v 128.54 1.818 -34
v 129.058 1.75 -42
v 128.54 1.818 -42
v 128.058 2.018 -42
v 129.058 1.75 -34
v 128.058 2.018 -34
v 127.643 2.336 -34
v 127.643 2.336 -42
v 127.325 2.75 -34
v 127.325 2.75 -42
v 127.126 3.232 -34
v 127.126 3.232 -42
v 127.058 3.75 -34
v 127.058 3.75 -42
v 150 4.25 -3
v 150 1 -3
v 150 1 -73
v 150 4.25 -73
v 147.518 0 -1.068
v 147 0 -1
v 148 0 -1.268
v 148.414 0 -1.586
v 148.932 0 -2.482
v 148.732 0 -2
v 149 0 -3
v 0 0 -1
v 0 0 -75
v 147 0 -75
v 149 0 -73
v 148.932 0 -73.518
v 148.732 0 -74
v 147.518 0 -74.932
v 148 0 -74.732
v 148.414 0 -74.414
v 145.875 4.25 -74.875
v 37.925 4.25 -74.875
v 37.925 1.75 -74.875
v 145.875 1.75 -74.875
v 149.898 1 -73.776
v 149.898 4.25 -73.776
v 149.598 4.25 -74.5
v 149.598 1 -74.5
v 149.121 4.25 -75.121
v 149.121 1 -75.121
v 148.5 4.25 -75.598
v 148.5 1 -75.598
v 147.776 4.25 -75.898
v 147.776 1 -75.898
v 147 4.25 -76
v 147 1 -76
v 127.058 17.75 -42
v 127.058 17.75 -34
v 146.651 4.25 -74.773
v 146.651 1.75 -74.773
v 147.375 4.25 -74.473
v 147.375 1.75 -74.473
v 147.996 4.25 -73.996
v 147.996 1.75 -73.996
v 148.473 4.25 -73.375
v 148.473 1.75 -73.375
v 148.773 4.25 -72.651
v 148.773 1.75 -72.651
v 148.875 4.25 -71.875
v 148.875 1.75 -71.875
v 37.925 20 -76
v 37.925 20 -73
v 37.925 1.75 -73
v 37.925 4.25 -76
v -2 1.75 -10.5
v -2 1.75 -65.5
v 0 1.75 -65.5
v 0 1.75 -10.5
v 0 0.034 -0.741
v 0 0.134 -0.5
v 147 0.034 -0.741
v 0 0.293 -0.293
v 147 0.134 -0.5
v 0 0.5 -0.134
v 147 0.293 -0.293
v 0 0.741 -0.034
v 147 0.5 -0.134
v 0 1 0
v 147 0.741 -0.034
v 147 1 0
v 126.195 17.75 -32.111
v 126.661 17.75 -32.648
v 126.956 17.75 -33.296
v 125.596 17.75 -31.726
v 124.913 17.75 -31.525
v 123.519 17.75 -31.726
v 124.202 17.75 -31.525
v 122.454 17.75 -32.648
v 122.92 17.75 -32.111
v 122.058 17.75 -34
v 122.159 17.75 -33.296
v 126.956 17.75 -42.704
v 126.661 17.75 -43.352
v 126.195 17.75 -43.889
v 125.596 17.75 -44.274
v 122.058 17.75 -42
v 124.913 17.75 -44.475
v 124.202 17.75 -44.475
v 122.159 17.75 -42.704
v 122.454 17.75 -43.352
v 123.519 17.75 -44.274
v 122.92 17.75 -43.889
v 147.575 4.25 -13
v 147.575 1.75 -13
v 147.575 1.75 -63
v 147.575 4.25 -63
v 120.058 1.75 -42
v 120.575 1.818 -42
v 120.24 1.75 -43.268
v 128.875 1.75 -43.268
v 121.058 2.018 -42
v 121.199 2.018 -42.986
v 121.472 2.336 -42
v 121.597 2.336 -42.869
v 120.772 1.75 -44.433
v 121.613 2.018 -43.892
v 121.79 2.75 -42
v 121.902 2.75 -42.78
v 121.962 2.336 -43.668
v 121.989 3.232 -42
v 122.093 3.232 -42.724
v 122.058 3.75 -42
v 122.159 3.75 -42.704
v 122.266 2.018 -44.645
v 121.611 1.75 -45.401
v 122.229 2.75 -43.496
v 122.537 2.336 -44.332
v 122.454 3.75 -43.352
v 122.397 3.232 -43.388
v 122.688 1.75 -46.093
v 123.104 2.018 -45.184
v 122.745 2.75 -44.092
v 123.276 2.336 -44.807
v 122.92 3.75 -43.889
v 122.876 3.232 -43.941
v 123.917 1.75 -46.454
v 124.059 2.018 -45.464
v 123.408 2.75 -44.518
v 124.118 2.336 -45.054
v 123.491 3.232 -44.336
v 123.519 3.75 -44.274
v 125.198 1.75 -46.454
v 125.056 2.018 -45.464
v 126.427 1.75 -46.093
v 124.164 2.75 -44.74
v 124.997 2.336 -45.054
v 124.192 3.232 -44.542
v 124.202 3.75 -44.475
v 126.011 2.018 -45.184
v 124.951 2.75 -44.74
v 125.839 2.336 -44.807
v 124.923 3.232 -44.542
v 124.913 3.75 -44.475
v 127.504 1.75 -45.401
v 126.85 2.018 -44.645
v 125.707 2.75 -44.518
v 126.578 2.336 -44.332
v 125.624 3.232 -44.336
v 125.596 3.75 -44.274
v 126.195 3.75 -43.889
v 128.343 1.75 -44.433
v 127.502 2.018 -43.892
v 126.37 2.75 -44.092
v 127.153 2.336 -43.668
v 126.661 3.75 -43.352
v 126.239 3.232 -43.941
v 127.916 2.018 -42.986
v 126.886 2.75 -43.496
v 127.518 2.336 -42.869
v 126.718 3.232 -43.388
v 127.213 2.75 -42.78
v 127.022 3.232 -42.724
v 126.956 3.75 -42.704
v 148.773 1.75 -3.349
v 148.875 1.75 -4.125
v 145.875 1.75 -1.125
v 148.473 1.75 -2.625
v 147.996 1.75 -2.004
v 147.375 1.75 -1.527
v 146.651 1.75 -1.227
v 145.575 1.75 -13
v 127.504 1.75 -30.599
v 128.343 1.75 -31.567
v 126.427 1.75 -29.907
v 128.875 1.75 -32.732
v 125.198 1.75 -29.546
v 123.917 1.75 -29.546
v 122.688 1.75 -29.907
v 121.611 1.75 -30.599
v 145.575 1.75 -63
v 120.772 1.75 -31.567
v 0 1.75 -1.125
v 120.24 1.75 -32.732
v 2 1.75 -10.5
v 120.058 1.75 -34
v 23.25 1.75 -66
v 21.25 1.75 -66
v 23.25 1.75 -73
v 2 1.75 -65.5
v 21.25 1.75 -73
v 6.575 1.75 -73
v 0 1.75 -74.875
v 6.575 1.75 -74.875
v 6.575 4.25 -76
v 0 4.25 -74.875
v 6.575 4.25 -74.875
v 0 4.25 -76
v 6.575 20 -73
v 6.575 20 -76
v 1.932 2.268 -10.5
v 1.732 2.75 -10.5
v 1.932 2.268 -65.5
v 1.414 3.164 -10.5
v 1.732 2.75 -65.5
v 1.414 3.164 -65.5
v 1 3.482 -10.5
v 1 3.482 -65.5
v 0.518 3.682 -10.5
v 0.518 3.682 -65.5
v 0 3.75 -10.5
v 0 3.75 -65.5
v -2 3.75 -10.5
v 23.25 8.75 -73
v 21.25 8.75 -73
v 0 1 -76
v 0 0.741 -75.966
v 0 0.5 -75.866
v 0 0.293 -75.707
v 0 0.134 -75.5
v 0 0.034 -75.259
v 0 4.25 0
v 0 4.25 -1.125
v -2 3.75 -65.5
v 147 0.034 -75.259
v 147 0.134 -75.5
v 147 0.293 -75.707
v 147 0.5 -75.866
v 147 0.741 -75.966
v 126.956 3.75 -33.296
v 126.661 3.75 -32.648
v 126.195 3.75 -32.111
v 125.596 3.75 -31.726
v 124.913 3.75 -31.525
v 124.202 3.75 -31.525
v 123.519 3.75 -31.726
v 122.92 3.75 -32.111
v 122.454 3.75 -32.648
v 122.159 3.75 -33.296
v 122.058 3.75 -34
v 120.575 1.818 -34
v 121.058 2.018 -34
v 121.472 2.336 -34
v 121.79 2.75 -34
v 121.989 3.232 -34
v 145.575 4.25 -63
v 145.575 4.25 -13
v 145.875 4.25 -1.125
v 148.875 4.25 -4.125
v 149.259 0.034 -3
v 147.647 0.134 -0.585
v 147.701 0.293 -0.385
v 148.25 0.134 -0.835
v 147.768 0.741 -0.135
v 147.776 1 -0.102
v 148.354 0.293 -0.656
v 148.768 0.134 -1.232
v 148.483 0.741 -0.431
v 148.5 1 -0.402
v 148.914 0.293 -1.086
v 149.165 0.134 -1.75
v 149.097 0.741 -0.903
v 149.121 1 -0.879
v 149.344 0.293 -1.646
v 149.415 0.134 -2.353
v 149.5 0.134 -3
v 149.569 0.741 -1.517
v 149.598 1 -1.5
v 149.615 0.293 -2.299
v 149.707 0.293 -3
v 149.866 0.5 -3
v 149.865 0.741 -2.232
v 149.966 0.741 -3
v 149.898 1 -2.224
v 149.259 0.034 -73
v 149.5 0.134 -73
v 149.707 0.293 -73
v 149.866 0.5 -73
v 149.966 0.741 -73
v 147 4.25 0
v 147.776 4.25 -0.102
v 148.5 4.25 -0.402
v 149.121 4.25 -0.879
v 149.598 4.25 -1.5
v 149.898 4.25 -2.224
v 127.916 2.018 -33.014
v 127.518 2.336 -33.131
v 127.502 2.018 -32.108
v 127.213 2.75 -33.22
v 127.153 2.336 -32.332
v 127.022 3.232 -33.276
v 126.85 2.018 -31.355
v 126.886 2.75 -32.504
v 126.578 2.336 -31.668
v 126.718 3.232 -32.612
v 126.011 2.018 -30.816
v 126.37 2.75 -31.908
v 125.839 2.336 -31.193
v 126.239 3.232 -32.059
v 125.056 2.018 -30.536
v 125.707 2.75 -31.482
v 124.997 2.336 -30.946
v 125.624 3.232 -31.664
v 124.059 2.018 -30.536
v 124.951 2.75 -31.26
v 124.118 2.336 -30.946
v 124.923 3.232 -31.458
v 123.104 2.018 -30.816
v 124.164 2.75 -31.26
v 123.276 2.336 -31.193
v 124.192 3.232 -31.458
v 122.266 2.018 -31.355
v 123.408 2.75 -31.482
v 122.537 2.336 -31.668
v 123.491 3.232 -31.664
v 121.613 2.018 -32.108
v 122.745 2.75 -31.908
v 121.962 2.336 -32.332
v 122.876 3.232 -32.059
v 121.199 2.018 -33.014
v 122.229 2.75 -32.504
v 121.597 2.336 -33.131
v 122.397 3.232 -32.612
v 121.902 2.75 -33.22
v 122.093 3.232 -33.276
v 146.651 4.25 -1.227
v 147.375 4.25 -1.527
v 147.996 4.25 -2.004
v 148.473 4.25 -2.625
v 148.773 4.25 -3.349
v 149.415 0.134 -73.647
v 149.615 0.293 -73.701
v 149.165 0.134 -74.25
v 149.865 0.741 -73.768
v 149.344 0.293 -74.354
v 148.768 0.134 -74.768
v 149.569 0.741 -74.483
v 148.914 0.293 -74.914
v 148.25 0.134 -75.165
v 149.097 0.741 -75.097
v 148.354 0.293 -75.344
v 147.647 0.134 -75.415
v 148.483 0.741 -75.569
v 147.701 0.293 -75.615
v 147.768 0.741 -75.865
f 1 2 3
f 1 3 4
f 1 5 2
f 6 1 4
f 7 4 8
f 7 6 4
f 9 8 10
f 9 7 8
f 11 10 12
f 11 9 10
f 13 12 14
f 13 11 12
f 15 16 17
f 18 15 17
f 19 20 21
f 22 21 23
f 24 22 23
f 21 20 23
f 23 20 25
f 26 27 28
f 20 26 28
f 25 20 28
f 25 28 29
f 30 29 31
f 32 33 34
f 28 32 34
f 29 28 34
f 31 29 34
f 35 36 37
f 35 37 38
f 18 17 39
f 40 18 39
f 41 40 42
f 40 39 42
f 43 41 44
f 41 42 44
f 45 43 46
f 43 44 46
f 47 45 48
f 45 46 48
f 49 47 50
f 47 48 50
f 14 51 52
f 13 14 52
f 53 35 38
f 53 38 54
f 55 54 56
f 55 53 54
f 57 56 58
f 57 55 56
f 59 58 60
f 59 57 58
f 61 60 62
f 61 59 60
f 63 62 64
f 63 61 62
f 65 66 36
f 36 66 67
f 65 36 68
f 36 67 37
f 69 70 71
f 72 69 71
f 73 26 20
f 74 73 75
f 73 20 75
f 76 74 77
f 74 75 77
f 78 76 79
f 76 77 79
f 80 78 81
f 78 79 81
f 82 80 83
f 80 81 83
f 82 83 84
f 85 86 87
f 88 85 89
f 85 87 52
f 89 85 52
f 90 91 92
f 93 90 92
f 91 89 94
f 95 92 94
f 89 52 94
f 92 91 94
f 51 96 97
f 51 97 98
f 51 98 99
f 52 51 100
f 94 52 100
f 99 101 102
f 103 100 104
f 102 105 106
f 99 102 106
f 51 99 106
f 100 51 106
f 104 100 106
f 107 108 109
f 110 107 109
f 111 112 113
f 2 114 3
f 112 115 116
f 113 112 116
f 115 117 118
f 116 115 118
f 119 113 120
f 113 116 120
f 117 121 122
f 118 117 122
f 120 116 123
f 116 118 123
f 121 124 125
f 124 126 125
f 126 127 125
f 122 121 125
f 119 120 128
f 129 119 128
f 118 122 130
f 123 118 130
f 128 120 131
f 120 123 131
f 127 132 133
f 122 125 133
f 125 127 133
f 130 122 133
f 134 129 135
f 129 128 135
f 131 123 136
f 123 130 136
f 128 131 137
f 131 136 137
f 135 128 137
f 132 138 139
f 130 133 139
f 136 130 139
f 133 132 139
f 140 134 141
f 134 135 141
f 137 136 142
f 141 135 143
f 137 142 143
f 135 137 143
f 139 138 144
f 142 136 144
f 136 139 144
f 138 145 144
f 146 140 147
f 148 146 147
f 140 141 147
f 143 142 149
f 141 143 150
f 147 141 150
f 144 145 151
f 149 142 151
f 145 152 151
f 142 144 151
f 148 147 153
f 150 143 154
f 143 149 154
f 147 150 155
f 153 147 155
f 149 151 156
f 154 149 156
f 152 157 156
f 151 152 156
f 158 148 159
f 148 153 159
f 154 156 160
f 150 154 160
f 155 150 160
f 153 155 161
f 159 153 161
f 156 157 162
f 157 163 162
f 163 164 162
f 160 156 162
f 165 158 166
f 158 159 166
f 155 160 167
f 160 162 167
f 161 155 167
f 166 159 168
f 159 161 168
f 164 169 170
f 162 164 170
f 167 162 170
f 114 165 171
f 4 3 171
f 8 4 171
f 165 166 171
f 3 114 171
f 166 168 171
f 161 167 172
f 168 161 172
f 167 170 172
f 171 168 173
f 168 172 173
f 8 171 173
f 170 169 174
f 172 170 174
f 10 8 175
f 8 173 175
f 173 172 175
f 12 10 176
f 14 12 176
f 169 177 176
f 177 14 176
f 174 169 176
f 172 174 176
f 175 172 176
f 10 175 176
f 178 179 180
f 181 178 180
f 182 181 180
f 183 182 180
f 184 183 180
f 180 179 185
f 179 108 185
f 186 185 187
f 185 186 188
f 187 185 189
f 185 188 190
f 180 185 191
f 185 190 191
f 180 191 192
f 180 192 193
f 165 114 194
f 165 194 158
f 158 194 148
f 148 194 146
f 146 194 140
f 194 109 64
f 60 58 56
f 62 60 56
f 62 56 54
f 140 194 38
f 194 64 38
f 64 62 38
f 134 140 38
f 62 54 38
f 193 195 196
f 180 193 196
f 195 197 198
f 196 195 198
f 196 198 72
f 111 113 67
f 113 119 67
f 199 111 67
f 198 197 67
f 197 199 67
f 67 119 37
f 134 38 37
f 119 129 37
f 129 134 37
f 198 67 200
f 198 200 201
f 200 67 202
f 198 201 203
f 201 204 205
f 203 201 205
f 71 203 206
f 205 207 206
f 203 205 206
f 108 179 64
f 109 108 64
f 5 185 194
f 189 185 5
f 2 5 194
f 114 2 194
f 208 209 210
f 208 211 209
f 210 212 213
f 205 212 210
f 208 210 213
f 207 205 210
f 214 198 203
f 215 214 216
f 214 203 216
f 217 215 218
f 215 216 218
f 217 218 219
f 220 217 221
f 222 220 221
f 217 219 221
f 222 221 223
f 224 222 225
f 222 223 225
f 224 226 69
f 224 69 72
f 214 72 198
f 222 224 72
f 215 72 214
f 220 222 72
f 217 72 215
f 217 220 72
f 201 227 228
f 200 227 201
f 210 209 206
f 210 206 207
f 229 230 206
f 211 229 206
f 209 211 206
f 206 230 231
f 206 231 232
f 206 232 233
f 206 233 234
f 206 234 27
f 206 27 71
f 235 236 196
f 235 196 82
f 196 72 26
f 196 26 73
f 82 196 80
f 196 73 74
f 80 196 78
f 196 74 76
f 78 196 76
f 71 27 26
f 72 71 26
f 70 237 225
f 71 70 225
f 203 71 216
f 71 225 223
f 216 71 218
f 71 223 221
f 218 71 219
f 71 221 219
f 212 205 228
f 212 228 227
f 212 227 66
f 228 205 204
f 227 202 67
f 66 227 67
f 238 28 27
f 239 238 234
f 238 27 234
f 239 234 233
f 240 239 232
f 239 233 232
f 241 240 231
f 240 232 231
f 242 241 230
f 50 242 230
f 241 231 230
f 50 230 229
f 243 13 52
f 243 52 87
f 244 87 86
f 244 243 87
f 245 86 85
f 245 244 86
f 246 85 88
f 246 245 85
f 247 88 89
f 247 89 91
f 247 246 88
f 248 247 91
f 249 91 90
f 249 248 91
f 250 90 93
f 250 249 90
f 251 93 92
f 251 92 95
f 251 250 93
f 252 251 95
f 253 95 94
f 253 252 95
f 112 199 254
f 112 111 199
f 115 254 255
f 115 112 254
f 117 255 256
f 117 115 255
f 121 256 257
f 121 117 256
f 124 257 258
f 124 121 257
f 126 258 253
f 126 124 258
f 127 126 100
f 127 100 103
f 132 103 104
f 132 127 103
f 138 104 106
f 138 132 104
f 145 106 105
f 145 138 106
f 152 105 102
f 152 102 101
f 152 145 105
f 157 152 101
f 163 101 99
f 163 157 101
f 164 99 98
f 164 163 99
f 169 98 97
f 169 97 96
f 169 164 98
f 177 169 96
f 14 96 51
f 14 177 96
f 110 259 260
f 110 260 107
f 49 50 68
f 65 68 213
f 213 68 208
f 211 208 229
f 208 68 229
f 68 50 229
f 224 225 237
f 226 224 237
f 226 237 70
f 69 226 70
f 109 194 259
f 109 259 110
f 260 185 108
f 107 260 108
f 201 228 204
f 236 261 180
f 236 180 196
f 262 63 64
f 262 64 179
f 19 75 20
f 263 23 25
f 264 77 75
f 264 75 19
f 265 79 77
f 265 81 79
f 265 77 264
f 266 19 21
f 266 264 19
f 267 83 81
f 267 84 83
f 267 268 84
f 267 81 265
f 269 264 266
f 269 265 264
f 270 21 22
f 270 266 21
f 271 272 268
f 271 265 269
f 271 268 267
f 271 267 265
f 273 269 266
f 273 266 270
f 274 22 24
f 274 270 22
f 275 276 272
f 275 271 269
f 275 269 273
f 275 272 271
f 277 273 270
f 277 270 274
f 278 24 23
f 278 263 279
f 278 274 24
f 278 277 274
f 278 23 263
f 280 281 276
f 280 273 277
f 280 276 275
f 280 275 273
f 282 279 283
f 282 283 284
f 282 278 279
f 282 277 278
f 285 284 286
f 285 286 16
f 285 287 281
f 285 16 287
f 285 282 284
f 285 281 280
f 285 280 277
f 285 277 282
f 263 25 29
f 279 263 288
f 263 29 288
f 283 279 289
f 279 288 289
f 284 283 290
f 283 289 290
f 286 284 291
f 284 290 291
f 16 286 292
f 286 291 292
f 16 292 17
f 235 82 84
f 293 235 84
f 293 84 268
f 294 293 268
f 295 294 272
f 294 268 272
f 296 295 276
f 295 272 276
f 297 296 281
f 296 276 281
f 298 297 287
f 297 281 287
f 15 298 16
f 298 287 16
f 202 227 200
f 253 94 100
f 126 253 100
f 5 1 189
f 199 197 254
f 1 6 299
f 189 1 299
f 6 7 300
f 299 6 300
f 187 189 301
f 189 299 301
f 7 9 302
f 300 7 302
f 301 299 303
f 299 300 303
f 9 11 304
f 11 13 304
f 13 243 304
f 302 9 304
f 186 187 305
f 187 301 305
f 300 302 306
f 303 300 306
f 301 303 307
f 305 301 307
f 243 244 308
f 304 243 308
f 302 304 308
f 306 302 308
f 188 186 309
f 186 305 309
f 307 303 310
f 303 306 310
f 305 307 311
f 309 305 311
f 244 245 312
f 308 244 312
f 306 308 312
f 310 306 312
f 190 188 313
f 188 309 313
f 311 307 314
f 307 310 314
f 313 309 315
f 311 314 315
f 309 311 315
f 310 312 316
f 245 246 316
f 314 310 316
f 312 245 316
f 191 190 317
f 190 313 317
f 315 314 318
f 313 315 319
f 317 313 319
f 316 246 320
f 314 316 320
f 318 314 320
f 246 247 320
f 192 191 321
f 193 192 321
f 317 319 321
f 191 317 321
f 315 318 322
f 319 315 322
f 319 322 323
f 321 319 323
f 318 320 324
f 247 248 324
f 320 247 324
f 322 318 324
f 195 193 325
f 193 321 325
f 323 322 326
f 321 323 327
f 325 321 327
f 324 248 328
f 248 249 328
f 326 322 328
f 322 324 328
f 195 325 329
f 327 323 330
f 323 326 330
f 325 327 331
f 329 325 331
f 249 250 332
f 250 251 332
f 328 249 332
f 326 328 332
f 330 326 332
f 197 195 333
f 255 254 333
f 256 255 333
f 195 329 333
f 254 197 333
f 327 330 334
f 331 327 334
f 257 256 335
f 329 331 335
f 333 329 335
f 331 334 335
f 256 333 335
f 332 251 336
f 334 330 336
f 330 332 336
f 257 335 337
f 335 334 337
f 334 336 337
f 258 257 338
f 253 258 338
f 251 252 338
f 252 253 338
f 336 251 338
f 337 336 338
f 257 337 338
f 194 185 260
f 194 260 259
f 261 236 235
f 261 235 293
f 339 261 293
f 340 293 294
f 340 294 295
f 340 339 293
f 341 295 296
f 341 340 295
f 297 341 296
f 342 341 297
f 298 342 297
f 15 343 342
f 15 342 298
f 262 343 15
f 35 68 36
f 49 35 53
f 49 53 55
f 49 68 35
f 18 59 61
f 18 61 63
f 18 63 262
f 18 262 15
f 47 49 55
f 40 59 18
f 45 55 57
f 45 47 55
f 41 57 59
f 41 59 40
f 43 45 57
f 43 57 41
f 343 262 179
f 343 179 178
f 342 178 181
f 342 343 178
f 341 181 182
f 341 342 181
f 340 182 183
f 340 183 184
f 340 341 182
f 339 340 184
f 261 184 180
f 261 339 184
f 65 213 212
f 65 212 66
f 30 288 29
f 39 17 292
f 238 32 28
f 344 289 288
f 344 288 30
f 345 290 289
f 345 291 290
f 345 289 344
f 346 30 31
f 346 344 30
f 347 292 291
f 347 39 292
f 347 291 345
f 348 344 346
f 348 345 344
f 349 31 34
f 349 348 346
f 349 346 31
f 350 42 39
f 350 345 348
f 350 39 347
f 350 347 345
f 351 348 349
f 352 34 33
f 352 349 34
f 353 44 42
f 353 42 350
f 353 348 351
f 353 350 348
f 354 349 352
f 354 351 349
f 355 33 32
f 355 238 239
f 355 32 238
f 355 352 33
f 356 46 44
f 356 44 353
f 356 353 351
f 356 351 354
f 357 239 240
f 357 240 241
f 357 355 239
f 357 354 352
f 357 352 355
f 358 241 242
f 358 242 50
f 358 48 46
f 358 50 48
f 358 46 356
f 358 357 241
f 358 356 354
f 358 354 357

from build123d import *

# Parameters (mm, degrees)
BOSS_EXTRUDE1_DEPTH = 4.25
CUT_EXTRUDE1_DEPTH  = 2.5
SKETCH3_W           = 31.35
SKETCH3_H           = 3
BOSS_EXTRUDE2_DEPTH = 20
FILLET1_R           = 1
SWEEP1_START        = -65.5
SWEEP1_DEPTH        = 55
SKETCH6_W           = 2
SKETCH6_H           = 50
BOSS_EXTRUDE3_DEPTH = 2.5
RIB1_REACH          = 151.987
SKETCH7_WALL_W      = 311.873243788
SKETCH7_WALL_H      = 2
BOSS_EXTRUDE4_DEPTH = 16
FILLET2_R           = 2


# Read off the part's stored shape, not the designer's step: Sweep1
with BuildPart() as part:
    # Sketch1 → Boss-Extrude1 (new body)
    with BuildSketch(Plane(origin=(0, 0, 0), x_dir=(1, 0, 0), z_dir=(0, 1, 0))):
        with BuildLine():
            Line((0, 0), (147, 0))
            ThreePointArc((147, 0), (149.121320344, 0.878679656), (150, 3))
            Line((150, 3), (150, 73))
            ThreePointArc((150, 73), (149.121320344, 75.121320344), (147, 76))
            Line((147, 76), (0, 76))
            Line((0, 76), (0, 0))
        make_face()
    extrude(amount=BOSS_EXTRUDE1_DEPTH)

    # Sketch2 → Cut-Extrude1 (cut)
    with BuildSketch(Plane(origin=(0, 4.25, 0), x_dir=(1, 0, 0), z_dir=(0, 1, 0))):
        with BuildLine():
            Line((0, 74.875), (145.875, 74.875))
            ThreePointArc((145.875, 74.875), (147.996320344, 73.996320344), (148.875, 71.875))
            Line((148.875, 71.875), (148.875, 4.125))
            ThreePointArc((148.875, 4.125), (147.996320344, 2.003679656), (145.875, 1.125))
            Line((145.875, 1.125), (0, 1.125))
            Line((0, 1.125), (0, 74.875))
        make_face()
    extrude(amount=-CUT_EXTRUDE1_DEPTH, mode=Mode.SUBTRACT)

    # Sketch3 → Boss-Extrude2 (add)
    with BuildSketch(Plane(origin=(0, 0, 0), x_dir=(1, 0, 0), z_dir=(0, 1, 0))):
        with Locations((22.25, 74.5)):
            Rectangle(SKETCH3_W, SKETCH3_H)
    extrude(amount=BOSS_EXTRUDE2_DEPTH)

    # Fillet1
    fillet1_edges = [part.edges().sort_by_distance(p)[0] for p in [
        (73.5, 0, 0),
        (149.121320344, 0, -0.878679656),
        (150, 0, -38),
        (149.121320344, 0, -75.121320344),
        (73.5, 0, -76),
    ]]
    fillet(fillet1_edges, radius=FILLET1_R)

    # Sweep1 outline → Sweep1 (add)
    with BuildSketch(Plane.XY.offset(SWEEP1_START)):
        with BuildLine():
            Line((0, 3.75), (-2, 3.75))
            Line((-2, 3.75), (-2, 1.75))
            Line((-2, 1.75), (2, 1.75))
            ThreePointArc((2, 1.75), (1.414213562, 3.164213562), (0, 3.75))
        make_face()
    extrude(amount=SWEEP1_DEPTH)

    # Sketch6 → Boss-Extrude3 (add)
    with BuildSketch(Plane(origin=(0, 1.75, 0), x_dir=(1, 0, 0), z_dir=(0, 1, 0))):
        with Locations((146.575, 38)):
            Rectangle(SKETCH6_W, SKETCH6_H)
    extrude(amount=BOSS_EXTRUDE3_DEPTH)

    # Sketch7 wall → Rib1 (add, up to next)
    with BuildSketch(Plane(origin=(22.25, 5.25, -69.5), x_dir=(0, -0.707106781187, 0.707106781187), z_dir=(0, 0.707106781187, 0.707106781187)), mode=Mode.PRIVATE) as rib1_sk1:
        Rectangle(SKETCH7_WALL_W, SKETCH7_WALL_H)
    rib1_tool1 = extrude(rib1_sk1.sketch, amount=-RIB1_REACH, mode=Mode.PRIVATE) - part.part
    add(rib1_tool1.solids().sort_by_distance((22.25, 5.25, -69.5))[0])

    # Sketch8 → Boss-Extrude4 (add)
    with BuildSketch(Plane(origin=(0, 1.75, 0), x_dir=(1, 0, 0), z_dir=(0, 1, 0))):
        with BuildLine():
            Line((127.05753899, 42), (127.05753899, 34))
            ThreePointArc((127.05753899, 34), (124.55753899, 31.5), (122.05753899, 34))
            Line((122.05753899, 34), (122.05753899, 42))
            ThreePointArc((122.05753899, 42), (124.55753899, 44.5), (127.05753899, 42))
        make_face()
    extrude(amount=BOSS_EXTRUDE4_DEPTH)

    # Fillet2
    fillet2_edges = [part.edges().sort_by_distance(p)[0] for p in [
        (124.55753899, 1.75, -44.5),
        (122.05753899, 1.75, -38),
        (124.55753899, 1.75, -31.5),
        (127.05753899, 1.75, -38),
    ]]
    fillet(fillet2_edges, radius=FILLET2_R)


solid = part.part
